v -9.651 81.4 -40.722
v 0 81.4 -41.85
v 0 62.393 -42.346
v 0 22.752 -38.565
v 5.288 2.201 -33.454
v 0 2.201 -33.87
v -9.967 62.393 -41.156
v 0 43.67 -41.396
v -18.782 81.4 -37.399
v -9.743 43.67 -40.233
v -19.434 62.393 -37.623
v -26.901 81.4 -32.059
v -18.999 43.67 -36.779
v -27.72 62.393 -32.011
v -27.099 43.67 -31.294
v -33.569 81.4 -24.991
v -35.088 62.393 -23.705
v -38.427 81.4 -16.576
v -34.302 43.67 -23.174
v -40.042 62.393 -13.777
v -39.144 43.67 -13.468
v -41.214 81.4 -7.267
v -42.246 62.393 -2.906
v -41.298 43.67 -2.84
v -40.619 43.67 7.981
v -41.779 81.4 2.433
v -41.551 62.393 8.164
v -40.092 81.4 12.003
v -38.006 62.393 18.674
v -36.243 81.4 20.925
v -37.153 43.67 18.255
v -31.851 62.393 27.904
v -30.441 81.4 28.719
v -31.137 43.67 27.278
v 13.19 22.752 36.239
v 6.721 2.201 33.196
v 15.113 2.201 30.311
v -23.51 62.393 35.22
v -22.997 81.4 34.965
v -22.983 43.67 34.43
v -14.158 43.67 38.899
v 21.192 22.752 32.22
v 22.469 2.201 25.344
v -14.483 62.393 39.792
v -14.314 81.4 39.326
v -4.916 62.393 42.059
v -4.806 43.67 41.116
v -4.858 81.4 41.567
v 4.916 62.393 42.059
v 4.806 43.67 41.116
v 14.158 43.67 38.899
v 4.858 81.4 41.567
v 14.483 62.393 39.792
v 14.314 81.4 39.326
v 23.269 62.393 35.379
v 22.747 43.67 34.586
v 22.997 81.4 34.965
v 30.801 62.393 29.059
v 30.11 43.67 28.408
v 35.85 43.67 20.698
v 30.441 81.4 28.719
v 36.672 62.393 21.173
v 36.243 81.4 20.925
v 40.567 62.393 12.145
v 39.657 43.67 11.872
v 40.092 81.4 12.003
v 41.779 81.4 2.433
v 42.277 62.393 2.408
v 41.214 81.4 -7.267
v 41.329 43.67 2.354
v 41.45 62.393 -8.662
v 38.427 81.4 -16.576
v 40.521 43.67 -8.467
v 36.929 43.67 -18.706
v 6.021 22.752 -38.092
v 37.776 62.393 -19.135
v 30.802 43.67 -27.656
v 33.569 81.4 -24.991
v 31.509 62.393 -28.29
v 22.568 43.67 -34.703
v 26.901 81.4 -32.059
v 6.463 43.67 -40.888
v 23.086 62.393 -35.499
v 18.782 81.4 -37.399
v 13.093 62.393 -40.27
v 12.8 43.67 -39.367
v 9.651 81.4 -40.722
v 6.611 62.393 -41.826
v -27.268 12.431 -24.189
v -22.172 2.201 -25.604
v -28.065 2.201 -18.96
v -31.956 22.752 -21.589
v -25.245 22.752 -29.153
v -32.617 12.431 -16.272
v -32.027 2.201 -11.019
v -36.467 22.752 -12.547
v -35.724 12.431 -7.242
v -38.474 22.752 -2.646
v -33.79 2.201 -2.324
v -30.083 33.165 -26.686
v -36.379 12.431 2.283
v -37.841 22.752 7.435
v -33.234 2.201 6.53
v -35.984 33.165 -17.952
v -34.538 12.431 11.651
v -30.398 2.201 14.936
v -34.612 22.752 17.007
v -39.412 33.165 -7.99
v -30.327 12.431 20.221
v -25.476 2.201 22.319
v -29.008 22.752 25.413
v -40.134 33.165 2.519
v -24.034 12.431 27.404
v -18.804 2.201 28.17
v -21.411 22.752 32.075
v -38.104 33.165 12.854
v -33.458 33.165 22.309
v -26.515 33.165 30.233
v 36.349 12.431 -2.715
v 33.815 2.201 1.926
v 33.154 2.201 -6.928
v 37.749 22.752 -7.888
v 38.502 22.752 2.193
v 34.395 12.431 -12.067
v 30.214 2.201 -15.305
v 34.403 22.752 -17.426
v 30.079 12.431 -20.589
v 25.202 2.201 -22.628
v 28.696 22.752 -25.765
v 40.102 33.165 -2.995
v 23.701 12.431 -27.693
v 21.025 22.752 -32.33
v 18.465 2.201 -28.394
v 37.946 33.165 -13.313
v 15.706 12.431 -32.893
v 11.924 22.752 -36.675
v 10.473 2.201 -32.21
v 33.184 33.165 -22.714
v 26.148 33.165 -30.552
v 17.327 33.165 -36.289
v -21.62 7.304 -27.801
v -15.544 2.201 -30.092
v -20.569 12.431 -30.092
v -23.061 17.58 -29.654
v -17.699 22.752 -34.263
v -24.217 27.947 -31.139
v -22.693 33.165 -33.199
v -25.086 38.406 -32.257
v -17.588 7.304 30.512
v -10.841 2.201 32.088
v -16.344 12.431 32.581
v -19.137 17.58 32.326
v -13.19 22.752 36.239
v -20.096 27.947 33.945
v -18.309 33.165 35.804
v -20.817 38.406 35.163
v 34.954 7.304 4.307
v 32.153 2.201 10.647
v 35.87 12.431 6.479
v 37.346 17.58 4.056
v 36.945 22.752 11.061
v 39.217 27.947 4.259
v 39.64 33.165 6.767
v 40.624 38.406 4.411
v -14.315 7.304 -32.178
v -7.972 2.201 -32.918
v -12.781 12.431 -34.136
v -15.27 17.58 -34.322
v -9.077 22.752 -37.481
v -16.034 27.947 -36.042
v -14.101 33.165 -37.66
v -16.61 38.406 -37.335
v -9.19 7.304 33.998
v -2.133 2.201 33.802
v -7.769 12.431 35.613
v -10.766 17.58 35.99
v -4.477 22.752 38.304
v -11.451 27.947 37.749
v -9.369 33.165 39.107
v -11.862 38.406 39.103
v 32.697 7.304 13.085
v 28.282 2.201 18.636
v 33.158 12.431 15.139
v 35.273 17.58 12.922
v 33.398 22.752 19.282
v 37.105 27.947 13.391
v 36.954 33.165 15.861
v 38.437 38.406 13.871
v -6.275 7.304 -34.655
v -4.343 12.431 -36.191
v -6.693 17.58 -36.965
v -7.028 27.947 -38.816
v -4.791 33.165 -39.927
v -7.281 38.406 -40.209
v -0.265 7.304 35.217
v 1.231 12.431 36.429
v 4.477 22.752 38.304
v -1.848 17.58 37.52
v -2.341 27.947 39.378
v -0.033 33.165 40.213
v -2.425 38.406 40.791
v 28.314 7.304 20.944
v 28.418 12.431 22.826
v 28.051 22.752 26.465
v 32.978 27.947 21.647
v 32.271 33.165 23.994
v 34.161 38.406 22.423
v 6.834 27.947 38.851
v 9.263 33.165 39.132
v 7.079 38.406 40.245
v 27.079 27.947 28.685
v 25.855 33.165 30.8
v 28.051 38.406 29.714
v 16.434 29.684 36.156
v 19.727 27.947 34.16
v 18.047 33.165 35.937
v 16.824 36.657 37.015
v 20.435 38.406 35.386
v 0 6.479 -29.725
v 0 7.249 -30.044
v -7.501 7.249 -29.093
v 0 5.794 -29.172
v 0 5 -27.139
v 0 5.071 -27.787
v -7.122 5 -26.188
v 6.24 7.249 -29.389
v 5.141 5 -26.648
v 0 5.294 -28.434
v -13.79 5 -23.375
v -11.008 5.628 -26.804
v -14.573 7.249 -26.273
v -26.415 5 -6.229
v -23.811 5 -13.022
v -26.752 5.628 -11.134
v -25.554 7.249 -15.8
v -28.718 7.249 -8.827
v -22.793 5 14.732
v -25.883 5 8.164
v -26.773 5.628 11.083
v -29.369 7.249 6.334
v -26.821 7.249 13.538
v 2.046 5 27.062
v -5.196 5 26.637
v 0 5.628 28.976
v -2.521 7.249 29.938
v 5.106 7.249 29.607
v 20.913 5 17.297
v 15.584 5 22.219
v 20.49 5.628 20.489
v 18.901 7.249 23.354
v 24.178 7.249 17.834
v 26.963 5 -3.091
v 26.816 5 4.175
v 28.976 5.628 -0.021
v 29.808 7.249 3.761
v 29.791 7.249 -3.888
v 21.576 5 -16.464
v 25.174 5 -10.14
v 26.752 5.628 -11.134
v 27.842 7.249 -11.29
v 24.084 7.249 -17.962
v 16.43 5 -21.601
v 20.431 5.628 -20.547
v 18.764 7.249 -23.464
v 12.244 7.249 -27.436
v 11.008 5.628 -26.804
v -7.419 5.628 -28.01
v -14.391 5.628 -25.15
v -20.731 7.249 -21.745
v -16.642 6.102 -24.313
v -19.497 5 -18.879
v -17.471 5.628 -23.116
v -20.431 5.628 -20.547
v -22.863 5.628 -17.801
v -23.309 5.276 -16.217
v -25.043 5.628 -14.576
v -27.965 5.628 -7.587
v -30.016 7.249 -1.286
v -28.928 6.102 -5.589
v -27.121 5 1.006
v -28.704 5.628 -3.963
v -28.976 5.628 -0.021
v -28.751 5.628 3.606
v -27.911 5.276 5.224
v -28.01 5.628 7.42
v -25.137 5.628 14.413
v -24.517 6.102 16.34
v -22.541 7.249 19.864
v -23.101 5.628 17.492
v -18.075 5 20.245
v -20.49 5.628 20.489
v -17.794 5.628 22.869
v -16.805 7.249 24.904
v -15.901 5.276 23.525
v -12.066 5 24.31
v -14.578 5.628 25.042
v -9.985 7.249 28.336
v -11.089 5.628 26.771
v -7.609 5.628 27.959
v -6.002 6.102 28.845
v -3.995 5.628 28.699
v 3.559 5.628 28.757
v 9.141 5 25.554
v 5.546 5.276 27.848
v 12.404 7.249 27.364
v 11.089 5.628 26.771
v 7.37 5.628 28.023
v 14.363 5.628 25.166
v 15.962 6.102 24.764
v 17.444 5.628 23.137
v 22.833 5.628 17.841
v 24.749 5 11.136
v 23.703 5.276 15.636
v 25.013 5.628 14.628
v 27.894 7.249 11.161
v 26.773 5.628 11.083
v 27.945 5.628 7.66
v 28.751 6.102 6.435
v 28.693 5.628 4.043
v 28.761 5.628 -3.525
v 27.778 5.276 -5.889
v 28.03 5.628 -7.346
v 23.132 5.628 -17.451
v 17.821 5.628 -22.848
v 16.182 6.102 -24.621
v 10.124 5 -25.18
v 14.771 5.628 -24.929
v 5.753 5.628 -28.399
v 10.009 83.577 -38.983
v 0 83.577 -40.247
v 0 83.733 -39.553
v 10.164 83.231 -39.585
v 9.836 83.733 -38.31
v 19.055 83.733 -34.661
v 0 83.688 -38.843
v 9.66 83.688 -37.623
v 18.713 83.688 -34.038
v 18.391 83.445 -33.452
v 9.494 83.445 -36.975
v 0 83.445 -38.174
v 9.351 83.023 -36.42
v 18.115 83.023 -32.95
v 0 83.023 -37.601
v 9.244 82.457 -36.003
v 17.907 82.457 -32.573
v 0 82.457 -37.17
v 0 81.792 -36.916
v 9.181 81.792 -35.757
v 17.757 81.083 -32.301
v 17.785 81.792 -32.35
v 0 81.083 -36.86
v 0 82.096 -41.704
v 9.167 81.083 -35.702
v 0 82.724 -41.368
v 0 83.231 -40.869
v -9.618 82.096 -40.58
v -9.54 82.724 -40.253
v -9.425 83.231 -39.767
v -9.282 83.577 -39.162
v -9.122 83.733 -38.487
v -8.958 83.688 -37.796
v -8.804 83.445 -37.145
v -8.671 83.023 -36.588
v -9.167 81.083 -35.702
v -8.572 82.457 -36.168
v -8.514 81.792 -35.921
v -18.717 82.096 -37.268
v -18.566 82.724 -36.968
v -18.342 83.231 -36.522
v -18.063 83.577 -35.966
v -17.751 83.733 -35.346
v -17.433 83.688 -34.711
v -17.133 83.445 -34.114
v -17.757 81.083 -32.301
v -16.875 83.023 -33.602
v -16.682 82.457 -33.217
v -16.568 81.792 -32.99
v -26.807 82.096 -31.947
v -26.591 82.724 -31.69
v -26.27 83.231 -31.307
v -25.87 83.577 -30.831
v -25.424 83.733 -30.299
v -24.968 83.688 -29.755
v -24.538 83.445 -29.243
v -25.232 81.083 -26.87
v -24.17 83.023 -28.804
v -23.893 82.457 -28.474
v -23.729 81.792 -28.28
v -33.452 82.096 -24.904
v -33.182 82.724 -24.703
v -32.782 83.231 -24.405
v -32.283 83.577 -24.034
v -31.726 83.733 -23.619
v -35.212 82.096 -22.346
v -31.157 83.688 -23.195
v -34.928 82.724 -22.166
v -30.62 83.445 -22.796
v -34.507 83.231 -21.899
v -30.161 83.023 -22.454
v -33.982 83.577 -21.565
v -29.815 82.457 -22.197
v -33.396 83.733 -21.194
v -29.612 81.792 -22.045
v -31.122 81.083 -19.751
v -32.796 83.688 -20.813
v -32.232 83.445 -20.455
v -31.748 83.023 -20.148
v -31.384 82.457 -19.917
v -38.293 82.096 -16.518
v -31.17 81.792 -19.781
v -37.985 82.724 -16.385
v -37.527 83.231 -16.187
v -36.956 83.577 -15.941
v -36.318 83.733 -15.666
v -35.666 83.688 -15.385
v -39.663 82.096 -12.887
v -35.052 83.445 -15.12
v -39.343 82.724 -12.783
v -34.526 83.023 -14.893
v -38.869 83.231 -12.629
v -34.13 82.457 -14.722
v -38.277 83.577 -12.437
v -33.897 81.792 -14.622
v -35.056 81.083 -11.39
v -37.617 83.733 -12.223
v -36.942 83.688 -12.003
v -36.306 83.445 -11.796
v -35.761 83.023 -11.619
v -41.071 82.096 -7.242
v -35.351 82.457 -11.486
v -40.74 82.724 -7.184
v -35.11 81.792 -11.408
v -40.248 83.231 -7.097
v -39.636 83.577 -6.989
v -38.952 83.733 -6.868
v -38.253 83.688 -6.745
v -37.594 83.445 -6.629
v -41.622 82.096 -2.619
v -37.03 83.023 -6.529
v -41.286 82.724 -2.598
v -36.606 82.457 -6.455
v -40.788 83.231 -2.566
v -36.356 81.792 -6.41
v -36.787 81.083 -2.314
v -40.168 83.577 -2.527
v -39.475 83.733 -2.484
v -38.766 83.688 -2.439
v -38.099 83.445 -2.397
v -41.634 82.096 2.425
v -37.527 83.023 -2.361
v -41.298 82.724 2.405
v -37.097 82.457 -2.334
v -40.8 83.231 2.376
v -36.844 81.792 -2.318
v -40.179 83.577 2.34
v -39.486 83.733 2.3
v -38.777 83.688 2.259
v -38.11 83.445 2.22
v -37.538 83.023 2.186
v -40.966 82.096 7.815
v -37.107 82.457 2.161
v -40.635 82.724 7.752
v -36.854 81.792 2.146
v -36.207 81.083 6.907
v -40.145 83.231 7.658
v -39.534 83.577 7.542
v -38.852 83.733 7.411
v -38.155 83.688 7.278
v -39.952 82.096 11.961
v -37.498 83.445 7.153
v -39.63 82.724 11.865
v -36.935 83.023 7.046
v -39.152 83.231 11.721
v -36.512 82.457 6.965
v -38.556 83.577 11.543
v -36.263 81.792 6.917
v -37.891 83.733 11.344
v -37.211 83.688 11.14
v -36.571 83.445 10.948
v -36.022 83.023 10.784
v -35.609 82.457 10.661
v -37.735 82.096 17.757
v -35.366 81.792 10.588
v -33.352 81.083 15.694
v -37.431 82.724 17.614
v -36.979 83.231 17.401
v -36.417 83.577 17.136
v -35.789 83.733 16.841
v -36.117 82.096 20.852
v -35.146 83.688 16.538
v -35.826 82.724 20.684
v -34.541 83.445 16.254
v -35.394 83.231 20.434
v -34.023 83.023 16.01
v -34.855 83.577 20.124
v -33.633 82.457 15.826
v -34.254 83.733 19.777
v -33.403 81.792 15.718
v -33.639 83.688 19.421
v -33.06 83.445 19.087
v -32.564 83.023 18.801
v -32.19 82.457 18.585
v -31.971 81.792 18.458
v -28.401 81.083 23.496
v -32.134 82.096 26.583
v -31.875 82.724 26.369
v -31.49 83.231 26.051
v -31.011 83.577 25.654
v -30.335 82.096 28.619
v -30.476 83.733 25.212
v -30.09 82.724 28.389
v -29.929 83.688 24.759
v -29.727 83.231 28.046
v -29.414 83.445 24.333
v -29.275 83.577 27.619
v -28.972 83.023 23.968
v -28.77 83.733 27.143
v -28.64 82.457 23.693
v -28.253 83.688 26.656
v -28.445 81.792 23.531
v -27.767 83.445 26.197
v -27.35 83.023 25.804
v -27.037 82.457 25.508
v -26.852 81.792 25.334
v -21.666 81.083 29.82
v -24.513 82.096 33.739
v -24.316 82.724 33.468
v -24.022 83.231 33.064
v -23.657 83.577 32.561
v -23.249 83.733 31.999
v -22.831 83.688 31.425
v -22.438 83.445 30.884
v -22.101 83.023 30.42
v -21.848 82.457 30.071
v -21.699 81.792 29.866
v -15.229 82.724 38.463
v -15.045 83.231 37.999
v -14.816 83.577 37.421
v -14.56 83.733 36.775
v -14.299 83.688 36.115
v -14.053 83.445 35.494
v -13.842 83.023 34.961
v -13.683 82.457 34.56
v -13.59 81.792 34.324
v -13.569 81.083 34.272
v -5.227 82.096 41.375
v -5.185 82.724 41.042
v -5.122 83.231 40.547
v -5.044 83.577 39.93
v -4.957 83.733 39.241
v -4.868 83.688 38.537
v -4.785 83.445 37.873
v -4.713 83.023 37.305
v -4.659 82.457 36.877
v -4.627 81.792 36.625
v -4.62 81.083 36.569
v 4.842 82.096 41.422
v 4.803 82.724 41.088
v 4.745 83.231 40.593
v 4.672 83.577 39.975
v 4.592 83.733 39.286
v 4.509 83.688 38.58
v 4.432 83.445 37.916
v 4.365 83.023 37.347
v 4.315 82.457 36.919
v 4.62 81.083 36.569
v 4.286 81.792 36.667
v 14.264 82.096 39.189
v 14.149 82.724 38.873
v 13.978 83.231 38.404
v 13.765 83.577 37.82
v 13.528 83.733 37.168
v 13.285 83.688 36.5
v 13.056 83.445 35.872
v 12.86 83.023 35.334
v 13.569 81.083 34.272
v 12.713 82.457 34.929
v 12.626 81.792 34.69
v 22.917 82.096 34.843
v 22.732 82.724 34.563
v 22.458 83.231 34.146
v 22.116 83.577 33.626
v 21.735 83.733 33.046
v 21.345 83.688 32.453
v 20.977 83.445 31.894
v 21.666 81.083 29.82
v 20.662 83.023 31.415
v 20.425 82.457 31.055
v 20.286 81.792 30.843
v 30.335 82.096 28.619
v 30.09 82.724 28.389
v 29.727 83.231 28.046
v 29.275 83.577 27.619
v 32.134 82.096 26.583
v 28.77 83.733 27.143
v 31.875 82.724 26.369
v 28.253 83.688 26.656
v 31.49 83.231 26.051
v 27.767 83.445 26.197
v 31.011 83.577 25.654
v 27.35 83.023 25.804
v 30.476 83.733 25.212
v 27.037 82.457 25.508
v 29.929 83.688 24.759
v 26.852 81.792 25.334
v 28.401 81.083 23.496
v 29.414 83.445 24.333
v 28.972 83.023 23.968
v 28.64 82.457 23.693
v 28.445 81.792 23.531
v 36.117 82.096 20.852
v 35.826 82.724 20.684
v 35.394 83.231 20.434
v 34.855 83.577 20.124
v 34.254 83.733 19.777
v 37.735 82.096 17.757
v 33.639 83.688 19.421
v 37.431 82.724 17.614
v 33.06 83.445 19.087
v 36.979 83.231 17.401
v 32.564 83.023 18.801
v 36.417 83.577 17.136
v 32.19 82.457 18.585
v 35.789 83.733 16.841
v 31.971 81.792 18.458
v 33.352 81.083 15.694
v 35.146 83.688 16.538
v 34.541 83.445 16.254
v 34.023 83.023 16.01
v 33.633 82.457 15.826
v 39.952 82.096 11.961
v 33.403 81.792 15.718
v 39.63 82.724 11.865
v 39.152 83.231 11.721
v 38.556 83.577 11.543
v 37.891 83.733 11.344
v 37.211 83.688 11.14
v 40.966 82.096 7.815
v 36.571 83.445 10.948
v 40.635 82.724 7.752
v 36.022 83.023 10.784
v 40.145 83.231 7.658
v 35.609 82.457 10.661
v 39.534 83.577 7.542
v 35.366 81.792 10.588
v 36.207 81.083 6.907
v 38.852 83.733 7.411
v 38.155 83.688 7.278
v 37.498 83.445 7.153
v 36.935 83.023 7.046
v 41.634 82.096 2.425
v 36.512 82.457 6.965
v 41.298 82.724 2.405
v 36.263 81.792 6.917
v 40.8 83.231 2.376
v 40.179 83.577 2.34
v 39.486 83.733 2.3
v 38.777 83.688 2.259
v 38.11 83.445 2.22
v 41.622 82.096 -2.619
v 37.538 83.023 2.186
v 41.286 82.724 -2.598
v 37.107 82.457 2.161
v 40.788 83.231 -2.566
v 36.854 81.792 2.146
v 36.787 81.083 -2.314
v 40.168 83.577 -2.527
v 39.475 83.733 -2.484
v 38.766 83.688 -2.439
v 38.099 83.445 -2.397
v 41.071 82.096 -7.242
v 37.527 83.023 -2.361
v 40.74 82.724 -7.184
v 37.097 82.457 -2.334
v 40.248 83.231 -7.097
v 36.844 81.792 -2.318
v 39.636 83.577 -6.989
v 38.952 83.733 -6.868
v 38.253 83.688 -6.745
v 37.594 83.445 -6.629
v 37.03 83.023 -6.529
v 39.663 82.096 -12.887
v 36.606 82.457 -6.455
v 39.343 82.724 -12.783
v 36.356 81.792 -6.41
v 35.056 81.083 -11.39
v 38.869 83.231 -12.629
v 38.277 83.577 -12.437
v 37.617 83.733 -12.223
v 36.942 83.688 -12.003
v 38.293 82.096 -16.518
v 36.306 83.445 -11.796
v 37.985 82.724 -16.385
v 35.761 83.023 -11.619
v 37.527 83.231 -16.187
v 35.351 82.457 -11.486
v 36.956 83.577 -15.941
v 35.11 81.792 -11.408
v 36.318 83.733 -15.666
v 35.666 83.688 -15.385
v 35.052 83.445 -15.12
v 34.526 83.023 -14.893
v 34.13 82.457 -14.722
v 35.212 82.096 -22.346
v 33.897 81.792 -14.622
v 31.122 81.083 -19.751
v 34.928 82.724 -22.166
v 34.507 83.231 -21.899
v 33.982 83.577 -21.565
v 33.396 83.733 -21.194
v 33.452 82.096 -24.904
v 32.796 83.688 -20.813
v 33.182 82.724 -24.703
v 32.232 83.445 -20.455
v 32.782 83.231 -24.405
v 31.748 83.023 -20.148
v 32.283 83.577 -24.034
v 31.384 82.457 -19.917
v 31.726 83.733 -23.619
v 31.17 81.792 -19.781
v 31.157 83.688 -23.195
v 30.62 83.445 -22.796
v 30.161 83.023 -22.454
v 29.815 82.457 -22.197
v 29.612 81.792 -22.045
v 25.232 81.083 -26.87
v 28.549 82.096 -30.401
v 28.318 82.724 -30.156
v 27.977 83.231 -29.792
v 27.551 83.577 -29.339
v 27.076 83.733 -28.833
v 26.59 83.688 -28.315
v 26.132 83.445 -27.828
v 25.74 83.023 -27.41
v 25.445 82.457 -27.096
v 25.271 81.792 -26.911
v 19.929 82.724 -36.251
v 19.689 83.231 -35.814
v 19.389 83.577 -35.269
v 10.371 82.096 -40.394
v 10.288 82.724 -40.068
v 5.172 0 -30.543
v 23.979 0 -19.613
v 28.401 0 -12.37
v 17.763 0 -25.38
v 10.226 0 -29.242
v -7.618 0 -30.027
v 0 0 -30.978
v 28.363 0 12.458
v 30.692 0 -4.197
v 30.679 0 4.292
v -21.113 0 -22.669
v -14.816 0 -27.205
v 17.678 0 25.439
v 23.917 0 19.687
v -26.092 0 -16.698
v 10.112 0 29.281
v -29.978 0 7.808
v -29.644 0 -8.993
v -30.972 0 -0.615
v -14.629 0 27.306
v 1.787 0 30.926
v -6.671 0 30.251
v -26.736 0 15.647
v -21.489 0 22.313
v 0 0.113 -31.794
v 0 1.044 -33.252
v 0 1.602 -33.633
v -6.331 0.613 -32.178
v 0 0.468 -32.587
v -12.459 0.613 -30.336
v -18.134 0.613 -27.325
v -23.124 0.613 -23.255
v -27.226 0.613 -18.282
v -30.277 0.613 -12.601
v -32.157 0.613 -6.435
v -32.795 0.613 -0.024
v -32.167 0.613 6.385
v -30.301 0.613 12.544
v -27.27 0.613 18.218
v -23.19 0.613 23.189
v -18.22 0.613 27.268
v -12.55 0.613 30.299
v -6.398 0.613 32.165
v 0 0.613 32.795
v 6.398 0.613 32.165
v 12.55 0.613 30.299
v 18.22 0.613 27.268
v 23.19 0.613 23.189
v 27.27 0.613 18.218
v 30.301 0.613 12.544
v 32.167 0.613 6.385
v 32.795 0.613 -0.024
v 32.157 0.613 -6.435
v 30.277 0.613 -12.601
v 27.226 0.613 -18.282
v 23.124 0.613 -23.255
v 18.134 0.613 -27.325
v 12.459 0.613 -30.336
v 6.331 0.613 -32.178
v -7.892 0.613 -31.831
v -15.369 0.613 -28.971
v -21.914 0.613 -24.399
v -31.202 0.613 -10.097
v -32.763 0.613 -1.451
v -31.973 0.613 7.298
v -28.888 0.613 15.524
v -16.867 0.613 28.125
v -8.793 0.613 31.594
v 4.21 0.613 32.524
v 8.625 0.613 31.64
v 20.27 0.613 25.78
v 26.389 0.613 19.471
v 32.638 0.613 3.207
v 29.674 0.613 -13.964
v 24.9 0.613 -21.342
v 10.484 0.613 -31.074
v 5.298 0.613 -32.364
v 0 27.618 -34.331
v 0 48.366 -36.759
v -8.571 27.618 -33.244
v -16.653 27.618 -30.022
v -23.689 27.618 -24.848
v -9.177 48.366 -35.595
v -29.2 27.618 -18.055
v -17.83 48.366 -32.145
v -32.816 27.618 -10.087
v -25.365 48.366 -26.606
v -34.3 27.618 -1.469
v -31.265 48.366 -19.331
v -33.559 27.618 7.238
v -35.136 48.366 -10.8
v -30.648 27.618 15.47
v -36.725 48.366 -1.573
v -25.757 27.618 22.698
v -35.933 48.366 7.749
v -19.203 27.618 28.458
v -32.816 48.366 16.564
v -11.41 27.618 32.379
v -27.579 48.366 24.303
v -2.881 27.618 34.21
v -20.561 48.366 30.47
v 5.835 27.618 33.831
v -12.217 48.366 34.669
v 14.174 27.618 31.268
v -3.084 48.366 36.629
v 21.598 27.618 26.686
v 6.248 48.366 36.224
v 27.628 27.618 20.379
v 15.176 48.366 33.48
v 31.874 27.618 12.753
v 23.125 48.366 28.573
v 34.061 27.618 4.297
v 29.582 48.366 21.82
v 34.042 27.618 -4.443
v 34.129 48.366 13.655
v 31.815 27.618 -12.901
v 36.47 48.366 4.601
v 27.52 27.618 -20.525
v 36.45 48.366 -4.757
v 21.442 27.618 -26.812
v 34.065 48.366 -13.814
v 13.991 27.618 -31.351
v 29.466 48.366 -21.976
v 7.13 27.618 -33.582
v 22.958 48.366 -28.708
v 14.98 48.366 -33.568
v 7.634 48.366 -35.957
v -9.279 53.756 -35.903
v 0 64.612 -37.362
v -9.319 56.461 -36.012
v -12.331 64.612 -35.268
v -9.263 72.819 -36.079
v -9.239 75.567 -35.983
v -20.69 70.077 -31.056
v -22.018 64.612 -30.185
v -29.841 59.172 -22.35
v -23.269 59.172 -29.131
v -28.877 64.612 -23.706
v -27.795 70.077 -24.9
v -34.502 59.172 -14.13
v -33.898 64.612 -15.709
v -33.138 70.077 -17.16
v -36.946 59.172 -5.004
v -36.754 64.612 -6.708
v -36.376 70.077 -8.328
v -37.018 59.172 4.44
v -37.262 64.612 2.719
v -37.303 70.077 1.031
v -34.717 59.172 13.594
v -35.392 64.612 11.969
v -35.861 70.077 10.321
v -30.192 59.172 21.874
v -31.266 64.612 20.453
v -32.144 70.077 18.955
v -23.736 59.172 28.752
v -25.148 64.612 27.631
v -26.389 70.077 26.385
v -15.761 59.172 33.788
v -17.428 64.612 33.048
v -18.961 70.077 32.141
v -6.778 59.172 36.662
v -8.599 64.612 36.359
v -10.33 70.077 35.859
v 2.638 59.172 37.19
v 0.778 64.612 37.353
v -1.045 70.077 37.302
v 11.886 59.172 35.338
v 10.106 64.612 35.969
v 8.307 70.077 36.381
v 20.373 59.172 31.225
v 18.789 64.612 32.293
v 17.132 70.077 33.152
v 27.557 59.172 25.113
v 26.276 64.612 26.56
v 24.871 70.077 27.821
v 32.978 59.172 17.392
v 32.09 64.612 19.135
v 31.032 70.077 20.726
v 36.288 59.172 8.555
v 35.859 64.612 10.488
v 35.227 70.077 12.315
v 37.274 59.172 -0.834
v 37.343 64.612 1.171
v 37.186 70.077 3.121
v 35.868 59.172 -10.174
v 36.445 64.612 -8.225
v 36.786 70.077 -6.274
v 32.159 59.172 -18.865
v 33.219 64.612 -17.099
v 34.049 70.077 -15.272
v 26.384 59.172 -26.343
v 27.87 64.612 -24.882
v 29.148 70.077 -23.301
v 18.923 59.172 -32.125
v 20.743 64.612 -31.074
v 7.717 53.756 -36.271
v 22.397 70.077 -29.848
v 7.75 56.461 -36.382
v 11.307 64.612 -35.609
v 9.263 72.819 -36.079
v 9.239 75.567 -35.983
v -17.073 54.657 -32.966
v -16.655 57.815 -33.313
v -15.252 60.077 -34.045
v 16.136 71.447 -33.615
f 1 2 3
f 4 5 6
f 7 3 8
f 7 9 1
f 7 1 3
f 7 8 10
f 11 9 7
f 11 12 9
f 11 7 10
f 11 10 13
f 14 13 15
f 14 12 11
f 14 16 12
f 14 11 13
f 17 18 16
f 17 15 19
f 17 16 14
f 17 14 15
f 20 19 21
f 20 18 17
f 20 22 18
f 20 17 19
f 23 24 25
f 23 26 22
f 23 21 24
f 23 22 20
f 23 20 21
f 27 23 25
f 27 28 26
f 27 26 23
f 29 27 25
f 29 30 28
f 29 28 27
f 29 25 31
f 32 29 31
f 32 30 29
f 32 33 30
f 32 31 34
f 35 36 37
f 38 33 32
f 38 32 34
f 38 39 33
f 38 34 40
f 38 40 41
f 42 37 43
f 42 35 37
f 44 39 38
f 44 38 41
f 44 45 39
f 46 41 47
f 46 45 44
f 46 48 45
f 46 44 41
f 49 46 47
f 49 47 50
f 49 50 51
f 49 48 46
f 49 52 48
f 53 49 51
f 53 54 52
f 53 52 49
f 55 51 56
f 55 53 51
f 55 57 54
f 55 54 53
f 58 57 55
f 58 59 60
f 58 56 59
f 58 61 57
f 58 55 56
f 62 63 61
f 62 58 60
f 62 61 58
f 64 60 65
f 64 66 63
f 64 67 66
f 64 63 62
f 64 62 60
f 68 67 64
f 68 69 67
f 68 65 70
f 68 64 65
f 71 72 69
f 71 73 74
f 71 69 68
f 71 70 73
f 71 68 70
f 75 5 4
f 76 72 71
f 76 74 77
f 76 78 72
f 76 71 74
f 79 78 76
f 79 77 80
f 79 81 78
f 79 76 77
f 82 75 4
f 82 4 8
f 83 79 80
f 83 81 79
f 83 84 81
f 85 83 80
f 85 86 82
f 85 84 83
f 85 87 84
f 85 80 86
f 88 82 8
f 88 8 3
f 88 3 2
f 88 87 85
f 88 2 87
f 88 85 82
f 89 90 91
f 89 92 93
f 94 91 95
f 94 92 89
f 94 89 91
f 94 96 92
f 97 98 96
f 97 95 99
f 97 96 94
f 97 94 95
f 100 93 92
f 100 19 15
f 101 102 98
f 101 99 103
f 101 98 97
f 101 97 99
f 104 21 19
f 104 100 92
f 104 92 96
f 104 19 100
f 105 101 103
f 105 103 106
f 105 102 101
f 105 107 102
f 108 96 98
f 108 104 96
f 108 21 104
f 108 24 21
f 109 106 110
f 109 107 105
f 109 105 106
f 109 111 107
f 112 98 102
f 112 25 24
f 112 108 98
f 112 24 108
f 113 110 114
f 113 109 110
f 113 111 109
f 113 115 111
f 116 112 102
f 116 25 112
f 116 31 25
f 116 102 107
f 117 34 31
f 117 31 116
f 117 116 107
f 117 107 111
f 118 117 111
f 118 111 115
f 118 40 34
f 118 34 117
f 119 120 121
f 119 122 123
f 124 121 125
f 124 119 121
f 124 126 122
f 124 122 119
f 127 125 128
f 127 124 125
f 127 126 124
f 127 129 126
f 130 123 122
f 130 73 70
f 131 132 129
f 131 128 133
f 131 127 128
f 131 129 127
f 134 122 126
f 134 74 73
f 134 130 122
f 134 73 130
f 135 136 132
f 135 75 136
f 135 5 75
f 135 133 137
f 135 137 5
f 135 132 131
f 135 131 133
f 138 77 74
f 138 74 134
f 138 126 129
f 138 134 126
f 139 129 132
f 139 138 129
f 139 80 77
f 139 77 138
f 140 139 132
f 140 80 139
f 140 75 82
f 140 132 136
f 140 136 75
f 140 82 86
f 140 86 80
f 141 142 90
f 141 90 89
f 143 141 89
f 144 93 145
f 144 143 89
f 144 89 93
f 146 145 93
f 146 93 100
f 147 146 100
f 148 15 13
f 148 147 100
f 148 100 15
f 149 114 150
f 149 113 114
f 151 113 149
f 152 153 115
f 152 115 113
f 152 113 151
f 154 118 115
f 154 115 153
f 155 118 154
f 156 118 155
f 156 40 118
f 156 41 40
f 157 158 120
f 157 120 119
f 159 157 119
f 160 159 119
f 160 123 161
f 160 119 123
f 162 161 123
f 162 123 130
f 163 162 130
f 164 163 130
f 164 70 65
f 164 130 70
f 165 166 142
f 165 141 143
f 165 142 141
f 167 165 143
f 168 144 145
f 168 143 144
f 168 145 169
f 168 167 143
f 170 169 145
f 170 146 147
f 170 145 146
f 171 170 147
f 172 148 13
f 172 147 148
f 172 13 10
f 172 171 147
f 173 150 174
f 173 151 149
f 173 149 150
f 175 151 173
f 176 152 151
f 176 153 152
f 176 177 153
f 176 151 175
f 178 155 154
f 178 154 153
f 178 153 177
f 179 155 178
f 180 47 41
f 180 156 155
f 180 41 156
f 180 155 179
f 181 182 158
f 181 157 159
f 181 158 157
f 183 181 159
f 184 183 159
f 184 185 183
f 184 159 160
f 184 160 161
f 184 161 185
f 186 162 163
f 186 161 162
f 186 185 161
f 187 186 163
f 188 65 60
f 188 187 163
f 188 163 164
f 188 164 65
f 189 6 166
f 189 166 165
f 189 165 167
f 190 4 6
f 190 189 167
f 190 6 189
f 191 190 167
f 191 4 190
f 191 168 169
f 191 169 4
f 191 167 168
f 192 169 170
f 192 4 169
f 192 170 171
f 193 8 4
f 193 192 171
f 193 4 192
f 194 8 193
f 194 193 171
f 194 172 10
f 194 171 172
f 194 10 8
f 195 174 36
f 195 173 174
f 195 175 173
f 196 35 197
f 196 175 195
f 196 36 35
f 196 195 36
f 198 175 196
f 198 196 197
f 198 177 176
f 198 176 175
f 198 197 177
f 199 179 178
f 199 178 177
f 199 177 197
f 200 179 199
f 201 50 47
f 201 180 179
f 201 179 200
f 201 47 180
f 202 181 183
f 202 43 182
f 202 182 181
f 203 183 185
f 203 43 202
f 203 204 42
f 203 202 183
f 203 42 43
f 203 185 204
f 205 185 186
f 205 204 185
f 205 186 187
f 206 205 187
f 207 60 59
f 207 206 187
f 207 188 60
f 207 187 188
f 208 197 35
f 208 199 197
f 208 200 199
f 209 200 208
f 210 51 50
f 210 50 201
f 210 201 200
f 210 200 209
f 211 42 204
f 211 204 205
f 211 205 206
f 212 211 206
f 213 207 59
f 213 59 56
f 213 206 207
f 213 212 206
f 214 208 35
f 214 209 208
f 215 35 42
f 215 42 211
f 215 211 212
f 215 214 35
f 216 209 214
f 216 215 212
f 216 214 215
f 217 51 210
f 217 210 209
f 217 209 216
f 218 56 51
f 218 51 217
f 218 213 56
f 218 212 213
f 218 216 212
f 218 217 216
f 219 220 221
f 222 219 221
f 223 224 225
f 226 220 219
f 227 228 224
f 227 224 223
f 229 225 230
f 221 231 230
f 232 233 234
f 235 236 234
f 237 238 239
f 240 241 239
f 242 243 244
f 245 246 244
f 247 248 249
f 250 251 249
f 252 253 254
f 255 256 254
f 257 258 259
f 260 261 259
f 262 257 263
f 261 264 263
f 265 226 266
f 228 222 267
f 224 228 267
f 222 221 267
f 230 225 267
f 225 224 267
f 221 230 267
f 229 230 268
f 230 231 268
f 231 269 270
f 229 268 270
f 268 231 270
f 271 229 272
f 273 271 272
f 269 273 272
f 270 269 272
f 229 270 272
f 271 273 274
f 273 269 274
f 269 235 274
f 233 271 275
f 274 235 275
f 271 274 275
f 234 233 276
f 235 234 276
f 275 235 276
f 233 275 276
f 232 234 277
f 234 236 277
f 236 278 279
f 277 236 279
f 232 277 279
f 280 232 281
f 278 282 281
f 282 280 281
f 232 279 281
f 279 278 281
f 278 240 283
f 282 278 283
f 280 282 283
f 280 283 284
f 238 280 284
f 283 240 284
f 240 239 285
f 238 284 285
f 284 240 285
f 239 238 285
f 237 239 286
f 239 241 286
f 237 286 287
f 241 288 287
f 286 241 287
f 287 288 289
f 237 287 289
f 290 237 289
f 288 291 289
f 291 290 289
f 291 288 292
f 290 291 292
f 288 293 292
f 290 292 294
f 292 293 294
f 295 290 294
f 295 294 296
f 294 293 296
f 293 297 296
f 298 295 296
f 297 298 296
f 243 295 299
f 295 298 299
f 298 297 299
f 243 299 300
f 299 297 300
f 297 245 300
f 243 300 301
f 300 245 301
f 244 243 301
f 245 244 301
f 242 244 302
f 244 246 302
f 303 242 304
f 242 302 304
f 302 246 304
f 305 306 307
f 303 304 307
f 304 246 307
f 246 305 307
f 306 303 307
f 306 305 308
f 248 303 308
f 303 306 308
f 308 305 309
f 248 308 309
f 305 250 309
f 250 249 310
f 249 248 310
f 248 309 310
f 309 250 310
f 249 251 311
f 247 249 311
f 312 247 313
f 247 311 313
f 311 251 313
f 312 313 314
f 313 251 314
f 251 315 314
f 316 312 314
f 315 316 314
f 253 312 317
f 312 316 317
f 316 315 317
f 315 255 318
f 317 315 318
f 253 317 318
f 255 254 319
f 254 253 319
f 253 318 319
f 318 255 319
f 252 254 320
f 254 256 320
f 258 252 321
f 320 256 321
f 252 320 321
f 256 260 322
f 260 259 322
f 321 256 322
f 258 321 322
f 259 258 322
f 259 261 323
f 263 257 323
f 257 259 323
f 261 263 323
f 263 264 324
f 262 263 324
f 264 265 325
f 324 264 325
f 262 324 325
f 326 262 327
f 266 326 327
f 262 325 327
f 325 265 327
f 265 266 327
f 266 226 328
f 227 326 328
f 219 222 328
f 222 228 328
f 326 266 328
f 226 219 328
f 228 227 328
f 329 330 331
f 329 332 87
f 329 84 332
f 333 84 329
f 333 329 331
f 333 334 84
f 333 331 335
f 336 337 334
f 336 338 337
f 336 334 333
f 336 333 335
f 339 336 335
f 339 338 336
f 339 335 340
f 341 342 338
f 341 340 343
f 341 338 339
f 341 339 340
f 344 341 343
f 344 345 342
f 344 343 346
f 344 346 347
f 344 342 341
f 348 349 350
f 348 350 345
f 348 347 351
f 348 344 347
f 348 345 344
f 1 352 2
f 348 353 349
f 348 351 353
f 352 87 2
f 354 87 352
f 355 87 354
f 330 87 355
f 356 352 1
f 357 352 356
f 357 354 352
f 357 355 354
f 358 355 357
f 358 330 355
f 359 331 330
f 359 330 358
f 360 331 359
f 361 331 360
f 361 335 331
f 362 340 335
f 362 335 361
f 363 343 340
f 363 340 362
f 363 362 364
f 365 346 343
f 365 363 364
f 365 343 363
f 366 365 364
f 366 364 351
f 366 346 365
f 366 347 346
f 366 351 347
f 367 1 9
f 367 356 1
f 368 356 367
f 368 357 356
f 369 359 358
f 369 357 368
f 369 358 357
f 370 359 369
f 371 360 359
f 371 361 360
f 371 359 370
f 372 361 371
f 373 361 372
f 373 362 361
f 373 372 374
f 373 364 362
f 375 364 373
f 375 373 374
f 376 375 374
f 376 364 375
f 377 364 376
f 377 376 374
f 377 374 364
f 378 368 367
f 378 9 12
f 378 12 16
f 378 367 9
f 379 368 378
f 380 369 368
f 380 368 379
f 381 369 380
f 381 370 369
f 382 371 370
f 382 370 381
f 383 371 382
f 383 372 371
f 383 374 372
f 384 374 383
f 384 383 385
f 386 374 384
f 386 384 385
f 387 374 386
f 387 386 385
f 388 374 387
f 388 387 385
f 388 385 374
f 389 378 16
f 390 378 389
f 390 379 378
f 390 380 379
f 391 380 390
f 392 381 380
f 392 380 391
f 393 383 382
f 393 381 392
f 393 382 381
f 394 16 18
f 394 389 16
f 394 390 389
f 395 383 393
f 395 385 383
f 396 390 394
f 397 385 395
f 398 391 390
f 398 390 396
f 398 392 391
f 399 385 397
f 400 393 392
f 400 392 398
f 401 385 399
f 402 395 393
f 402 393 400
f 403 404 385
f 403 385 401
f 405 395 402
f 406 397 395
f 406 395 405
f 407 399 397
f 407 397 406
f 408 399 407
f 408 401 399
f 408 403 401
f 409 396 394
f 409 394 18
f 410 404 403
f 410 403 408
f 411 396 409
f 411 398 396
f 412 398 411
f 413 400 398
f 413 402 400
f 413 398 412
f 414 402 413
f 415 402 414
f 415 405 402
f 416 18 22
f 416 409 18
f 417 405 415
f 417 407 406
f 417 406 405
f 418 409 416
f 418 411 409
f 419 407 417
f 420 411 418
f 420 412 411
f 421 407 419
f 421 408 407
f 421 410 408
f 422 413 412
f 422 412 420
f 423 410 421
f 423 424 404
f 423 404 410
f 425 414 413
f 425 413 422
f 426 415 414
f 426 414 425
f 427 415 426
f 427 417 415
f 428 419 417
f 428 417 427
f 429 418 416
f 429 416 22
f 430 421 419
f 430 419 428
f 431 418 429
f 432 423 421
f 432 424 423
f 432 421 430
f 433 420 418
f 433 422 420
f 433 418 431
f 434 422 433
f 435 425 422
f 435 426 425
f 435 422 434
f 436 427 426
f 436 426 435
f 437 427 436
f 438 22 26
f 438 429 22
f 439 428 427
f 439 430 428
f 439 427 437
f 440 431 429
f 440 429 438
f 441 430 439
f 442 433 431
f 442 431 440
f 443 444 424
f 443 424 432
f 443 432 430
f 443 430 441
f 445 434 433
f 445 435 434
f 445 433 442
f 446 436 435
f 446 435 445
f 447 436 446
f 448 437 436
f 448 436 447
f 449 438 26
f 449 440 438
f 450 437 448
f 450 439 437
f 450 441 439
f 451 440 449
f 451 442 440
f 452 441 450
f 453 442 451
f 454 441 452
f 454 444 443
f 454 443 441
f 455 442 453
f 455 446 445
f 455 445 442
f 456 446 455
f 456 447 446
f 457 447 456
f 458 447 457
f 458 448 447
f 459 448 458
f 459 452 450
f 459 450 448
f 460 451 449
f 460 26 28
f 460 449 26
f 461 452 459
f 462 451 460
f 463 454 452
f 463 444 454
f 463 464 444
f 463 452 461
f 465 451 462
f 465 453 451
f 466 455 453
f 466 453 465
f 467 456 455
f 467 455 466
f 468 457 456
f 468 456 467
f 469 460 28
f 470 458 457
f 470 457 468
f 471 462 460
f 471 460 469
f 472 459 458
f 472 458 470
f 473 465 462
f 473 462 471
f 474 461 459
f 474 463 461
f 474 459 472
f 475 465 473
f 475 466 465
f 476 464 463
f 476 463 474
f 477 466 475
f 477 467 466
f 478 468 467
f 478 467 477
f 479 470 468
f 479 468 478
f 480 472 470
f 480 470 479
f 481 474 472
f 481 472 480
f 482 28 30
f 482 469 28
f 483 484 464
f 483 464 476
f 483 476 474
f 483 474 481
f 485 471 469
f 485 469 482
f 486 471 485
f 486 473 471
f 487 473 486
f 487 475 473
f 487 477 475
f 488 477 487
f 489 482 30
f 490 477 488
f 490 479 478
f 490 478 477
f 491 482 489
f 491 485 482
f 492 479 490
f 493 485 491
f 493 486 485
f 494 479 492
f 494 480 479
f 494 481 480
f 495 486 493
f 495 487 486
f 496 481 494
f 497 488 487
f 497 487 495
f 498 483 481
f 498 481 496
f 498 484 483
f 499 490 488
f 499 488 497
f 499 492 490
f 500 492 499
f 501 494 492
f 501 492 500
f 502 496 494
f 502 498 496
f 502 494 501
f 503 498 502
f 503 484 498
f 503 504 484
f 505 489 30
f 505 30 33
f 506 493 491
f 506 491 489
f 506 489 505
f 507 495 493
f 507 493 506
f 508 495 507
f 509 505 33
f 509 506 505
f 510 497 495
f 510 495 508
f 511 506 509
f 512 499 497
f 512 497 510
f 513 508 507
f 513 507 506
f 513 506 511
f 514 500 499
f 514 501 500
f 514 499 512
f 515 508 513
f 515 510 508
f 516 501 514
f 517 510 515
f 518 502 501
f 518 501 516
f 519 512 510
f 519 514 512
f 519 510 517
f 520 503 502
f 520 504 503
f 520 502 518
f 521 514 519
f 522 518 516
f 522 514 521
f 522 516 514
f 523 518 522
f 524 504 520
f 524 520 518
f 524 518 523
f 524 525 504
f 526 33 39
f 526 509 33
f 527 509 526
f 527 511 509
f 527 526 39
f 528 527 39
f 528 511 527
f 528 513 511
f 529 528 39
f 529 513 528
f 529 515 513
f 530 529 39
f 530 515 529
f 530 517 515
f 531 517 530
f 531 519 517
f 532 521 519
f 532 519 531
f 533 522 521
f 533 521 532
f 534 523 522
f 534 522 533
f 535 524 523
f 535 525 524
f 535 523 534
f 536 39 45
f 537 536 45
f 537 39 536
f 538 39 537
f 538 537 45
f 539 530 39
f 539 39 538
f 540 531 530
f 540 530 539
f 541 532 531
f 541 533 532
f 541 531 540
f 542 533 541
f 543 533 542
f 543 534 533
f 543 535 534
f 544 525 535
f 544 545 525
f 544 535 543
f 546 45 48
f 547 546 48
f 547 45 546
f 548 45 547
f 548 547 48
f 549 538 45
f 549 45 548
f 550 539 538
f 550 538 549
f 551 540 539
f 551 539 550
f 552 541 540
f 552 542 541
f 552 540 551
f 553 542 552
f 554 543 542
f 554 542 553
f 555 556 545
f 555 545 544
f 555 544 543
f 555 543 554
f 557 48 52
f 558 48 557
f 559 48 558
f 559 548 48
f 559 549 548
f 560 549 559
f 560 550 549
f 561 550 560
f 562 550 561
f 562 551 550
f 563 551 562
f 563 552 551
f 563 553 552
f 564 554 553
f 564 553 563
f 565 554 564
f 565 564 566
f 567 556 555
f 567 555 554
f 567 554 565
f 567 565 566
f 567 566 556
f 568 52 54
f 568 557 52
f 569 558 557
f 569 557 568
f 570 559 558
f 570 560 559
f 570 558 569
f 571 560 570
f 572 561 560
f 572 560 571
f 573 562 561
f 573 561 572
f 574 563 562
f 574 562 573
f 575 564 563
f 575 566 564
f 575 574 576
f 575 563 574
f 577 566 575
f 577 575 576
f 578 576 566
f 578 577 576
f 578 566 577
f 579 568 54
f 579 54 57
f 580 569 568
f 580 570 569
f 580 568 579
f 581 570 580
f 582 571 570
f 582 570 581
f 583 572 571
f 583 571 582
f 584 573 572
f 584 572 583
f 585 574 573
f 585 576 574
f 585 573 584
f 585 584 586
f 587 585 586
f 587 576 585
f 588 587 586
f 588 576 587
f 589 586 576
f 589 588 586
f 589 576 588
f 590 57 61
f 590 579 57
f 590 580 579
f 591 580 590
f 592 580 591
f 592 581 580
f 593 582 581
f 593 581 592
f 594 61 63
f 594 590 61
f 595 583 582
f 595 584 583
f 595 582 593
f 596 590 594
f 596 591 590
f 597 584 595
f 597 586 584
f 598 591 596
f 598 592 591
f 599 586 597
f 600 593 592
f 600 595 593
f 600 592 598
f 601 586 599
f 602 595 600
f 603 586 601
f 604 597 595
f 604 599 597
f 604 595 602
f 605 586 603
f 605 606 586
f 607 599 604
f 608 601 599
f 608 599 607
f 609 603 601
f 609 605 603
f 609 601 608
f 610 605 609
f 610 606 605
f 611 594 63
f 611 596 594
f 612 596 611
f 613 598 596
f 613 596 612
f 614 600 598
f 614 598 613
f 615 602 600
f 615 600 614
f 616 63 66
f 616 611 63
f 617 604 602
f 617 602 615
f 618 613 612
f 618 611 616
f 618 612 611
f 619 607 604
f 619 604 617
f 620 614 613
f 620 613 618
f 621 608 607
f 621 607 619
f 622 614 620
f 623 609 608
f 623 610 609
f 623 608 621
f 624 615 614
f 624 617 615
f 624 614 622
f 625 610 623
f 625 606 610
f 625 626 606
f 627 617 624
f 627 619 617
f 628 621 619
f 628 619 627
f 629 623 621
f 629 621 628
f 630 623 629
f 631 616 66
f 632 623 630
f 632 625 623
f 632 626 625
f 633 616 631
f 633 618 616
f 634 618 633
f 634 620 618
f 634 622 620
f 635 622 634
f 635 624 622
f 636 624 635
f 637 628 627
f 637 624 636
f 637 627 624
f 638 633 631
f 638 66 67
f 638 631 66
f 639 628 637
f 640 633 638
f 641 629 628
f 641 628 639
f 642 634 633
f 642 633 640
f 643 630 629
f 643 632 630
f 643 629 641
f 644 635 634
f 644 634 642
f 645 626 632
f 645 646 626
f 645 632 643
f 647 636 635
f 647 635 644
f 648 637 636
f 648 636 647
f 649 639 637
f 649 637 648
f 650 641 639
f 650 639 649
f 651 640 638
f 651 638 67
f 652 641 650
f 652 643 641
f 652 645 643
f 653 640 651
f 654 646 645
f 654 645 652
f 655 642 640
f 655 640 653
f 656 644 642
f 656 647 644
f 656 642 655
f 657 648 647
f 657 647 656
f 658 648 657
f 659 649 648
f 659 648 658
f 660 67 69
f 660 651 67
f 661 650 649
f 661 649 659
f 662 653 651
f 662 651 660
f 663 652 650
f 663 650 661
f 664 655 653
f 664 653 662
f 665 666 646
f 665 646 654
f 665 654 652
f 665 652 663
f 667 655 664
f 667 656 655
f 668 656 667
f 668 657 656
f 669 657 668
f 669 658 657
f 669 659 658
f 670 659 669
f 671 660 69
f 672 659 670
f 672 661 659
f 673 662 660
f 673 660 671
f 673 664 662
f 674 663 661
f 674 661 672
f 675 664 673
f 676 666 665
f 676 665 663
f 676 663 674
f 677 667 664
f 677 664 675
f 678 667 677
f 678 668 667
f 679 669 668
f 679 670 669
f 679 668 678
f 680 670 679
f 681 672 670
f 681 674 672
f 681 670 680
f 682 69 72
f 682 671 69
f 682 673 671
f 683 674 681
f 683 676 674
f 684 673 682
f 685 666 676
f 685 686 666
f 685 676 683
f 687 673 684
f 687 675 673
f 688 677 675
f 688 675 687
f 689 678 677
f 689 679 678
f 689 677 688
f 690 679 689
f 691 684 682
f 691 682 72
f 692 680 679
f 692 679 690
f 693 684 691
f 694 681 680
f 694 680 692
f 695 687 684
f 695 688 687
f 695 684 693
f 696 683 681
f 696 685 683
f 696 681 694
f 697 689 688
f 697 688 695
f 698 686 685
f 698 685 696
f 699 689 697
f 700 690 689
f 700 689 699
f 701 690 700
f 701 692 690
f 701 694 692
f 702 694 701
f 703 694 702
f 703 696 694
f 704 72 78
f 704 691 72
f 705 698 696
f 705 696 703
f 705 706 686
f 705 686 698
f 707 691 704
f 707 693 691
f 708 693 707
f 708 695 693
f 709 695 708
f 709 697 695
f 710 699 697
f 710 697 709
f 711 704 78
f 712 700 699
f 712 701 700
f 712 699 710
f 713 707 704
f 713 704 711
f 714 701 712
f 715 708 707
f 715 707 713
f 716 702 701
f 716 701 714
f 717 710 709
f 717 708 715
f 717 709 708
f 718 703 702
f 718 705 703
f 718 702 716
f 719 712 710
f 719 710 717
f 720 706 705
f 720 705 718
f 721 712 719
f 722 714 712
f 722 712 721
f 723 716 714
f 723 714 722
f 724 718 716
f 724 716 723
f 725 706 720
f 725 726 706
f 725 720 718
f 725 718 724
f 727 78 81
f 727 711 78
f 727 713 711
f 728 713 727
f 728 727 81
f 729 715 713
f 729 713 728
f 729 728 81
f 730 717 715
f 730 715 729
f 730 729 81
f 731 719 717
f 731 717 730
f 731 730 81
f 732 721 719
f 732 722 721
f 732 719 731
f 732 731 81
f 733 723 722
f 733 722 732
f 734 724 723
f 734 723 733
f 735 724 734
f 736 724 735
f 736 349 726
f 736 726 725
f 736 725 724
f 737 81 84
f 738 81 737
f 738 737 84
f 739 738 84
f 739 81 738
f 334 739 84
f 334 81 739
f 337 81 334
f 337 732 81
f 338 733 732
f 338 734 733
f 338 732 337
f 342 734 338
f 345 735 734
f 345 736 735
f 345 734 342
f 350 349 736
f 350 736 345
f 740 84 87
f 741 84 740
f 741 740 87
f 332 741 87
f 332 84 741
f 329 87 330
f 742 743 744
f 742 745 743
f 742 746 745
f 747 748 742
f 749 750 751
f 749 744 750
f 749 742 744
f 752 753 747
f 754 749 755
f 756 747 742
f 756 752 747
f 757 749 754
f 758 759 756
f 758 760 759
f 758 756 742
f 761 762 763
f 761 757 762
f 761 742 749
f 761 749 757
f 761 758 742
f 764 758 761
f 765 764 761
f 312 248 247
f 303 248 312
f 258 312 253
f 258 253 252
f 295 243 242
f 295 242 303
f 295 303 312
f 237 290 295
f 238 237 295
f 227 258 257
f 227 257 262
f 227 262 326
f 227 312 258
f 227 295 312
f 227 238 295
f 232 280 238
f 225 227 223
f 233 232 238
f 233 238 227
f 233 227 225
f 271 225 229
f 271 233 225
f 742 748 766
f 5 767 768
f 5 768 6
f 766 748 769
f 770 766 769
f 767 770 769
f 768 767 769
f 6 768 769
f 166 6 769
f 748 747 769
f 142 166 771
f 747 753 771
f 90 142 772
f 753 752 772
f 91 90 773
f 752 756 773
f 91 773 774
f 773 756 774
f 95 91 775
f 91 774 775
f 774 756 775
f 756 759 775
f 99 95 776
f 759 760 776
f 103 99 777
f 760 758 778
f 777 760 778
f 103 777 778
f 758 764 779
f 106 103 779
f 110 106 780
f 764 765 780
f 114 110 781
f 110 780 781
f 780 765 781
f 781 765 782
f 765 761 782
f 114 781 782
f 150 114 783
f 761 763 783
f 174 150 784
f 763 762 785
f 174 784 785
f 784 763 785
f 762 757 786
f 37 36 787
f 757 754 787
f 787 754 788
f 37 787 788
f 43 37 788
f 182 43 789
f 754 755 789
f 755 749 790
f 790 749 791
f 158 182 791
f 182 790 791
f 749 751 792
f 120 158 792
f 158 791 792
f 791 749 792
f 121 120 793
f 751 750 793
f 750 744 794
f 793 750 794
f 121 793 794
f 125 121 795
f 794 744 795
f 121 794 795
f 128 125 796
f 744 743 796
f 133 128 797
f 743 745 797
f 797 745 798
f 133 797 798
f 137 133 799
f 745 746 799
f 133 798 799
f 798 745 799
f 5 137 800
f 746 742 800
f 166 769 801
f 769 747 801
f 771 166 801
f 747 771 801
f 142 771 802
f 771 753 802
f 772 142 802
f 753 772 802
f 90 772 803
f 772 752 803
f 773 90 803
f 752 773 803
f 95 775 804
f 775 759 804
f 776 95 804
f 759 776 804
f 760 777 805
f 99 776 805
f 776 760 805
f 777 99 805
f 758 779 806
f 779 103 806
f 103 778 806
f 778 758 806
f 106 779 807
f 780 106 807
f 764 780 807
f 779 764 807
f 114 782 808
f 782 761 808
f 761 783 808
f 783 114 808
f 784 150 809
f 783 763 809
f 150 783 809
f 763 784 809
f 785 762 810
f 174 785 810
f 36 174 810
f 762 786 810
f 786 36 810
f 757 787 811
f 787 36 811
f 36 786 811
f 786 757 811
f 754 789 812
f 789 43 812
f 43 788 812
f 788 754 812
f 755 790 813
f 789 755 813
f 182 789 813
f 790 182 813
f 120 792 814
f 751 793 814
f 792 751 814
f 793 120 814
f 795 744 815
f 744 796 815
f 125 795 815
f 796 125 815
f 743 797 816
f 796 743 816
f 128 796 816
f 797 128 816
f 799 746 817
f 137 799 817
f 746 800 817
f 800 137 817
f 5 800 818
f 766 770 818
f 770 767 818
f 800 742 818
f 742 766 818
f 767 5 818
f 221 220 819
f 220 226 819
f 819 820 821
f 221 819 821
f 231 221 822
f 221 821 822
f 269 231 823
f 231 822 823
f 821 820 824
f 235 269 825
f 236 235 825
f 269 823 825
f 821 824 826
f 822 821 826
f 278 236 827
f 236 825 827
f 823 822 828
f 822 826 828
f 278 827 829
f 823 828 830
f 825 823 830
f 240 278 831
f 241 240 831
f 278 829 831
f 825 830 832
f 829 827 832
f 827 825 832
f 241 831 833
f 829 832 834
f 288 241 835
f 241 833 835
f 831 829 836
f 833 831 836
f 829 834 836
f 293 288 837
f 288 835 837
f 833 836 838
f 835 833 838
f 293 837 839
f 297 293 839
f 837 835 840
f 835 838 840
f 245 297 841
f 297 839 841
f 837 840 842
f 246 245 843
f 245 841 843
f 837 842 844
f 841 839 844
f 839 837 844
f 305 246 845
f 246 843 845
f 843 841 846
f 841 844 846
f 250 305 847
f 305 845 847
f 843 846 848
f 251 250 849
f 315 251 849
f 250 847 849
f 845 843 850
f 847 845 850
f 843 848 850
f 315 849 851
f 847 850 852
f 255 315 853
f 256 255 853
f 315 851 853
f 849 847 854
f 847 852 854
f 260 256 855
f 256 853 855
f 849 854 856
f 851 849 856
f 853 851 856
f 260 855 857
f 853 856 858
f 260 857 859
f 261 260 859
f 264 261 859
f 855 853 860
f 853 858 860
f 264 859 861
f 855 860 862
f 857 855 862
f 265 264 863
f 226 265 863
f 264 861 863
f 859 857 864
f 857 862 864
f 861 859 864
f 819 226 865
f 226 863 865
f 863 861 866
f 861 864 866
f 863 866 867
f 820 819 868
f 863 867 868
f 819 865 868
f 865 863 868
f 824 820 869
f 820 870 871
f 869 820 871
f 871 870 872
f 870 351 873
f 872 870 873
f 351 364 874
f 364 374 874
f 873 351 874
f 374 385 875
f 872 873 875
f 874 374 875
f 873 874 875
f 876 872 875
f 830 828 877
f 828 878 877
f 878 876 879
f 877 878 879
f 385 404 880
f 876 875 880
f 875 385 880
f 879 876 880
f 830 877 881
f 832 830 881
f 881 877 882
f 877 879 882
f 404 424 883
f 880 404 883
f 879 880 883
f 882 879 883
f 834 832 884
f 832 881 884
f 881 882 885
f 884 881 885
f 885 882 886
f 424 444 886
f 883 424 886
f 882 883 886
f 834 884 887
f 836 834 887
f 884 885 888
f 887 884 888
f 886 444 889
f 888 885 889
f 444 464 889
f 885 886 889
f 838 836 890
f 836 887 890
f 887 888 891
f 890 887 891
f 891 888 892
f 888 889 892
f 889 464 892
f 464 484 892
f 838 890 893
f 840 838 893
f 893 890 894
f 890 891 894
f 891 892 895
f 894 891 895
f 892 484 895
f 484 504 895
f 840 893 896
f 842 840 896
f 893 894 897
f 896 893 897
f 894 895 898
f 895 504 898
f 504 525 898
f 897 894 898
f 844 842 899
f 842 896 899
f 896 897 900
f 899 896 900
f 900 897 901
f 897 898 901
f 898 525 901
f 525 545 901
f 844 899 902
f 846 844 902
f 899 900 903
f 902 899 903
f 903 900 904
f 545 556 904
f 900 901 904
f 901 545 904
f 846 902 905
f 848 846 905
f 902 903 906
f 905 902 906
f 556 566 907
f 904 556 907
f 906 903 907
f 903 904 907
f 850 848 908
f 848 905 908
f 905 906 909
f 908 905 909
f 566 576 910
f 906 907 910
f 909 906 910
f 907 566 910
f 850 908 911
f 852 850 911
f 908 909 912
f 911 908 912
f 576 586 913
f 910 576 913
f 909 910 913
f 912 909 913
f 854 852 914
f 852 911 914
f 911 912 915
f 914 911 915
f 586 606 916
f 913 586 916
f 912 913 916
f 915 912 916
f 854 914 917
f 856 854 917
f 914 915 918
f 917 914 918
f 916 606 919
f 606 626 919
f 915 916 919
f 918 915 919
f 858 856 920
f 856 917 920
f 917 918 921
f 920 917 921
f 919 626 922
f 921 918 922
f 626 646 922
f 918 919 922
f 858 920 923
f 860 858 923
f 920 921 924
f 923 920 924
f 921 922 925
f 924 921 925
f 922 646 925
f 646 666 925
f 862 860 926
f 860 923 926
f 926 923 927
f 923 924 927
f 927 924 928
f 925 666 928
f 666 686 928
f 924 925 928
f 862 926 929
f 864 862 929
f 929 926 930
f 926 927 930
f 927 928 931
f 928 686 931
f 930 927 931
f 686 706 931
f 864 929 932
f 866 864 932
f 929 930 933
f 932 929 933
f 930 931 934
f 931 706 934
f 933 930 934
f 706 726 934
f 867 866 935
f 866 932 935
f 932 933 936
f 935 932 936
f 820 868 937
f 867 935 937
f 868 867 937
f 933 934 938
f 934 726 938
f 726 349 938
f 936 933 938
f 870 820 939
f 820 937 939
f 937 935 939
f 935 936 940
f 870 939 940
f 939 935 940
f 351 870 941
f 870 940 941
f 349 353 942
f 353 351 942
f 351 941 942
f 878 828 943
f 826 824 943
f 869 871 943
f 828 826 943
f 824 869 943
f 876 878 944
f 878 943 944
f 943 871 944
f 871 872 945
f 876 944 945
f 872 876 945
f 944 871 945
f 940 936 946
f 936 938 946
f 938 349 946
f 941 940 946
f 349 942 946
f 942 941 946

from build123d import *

# Parameters (mm, degrees)
FILLET1_R = 3


with BuildPart() as part:
    # Sketch1 → Revolve1 (revolve)
    with BuildSketch(Plane.XY, mode=Mode.PRIVATE) as revolve1_sk:
        with BuildLine():
            Line((0, 0), (33.25, 0))
            add(Edge.make_bspline(
                [(33.25, 0), (44.526415367, 39.325533825), (41.85, 81.4)],
                knots=[0, 0, 0, 1, 1, 1], degree=2))
            ThreePointArc((41.85, 81.4), (39.196335007, 83.736249581), (36.860085426, 81.082584587))
            add(Edge.make_bspline(
                [(29.450398717, 5), (39.356864782, 41.780473165), (36.860085426, 81.082584587)],
                knots=[0.046969767, 0.046969767, 0.046969767, 1, 1, 1], degree=2))
            Line((29.450398717, 5), (0, 5))
            Line((0, 5), (0, 0))
        make_face()
    revolve(revolve1_sk.sketch.rotate(Axis((0, 0, 0), (0, 1, 0)), 90), axis=Axis((0, 0, 0), (0, 1, 0)))

    # Fillet1
    fillet1_edges = [part.edges().sort_by_distance(p)[0] for p in [
        (0, 0, 33.25),
        (0, 5, 29.450398717),
    ]]
    fillet(fillet1_edges, radius=FILLET1_R)


solid = part.part
